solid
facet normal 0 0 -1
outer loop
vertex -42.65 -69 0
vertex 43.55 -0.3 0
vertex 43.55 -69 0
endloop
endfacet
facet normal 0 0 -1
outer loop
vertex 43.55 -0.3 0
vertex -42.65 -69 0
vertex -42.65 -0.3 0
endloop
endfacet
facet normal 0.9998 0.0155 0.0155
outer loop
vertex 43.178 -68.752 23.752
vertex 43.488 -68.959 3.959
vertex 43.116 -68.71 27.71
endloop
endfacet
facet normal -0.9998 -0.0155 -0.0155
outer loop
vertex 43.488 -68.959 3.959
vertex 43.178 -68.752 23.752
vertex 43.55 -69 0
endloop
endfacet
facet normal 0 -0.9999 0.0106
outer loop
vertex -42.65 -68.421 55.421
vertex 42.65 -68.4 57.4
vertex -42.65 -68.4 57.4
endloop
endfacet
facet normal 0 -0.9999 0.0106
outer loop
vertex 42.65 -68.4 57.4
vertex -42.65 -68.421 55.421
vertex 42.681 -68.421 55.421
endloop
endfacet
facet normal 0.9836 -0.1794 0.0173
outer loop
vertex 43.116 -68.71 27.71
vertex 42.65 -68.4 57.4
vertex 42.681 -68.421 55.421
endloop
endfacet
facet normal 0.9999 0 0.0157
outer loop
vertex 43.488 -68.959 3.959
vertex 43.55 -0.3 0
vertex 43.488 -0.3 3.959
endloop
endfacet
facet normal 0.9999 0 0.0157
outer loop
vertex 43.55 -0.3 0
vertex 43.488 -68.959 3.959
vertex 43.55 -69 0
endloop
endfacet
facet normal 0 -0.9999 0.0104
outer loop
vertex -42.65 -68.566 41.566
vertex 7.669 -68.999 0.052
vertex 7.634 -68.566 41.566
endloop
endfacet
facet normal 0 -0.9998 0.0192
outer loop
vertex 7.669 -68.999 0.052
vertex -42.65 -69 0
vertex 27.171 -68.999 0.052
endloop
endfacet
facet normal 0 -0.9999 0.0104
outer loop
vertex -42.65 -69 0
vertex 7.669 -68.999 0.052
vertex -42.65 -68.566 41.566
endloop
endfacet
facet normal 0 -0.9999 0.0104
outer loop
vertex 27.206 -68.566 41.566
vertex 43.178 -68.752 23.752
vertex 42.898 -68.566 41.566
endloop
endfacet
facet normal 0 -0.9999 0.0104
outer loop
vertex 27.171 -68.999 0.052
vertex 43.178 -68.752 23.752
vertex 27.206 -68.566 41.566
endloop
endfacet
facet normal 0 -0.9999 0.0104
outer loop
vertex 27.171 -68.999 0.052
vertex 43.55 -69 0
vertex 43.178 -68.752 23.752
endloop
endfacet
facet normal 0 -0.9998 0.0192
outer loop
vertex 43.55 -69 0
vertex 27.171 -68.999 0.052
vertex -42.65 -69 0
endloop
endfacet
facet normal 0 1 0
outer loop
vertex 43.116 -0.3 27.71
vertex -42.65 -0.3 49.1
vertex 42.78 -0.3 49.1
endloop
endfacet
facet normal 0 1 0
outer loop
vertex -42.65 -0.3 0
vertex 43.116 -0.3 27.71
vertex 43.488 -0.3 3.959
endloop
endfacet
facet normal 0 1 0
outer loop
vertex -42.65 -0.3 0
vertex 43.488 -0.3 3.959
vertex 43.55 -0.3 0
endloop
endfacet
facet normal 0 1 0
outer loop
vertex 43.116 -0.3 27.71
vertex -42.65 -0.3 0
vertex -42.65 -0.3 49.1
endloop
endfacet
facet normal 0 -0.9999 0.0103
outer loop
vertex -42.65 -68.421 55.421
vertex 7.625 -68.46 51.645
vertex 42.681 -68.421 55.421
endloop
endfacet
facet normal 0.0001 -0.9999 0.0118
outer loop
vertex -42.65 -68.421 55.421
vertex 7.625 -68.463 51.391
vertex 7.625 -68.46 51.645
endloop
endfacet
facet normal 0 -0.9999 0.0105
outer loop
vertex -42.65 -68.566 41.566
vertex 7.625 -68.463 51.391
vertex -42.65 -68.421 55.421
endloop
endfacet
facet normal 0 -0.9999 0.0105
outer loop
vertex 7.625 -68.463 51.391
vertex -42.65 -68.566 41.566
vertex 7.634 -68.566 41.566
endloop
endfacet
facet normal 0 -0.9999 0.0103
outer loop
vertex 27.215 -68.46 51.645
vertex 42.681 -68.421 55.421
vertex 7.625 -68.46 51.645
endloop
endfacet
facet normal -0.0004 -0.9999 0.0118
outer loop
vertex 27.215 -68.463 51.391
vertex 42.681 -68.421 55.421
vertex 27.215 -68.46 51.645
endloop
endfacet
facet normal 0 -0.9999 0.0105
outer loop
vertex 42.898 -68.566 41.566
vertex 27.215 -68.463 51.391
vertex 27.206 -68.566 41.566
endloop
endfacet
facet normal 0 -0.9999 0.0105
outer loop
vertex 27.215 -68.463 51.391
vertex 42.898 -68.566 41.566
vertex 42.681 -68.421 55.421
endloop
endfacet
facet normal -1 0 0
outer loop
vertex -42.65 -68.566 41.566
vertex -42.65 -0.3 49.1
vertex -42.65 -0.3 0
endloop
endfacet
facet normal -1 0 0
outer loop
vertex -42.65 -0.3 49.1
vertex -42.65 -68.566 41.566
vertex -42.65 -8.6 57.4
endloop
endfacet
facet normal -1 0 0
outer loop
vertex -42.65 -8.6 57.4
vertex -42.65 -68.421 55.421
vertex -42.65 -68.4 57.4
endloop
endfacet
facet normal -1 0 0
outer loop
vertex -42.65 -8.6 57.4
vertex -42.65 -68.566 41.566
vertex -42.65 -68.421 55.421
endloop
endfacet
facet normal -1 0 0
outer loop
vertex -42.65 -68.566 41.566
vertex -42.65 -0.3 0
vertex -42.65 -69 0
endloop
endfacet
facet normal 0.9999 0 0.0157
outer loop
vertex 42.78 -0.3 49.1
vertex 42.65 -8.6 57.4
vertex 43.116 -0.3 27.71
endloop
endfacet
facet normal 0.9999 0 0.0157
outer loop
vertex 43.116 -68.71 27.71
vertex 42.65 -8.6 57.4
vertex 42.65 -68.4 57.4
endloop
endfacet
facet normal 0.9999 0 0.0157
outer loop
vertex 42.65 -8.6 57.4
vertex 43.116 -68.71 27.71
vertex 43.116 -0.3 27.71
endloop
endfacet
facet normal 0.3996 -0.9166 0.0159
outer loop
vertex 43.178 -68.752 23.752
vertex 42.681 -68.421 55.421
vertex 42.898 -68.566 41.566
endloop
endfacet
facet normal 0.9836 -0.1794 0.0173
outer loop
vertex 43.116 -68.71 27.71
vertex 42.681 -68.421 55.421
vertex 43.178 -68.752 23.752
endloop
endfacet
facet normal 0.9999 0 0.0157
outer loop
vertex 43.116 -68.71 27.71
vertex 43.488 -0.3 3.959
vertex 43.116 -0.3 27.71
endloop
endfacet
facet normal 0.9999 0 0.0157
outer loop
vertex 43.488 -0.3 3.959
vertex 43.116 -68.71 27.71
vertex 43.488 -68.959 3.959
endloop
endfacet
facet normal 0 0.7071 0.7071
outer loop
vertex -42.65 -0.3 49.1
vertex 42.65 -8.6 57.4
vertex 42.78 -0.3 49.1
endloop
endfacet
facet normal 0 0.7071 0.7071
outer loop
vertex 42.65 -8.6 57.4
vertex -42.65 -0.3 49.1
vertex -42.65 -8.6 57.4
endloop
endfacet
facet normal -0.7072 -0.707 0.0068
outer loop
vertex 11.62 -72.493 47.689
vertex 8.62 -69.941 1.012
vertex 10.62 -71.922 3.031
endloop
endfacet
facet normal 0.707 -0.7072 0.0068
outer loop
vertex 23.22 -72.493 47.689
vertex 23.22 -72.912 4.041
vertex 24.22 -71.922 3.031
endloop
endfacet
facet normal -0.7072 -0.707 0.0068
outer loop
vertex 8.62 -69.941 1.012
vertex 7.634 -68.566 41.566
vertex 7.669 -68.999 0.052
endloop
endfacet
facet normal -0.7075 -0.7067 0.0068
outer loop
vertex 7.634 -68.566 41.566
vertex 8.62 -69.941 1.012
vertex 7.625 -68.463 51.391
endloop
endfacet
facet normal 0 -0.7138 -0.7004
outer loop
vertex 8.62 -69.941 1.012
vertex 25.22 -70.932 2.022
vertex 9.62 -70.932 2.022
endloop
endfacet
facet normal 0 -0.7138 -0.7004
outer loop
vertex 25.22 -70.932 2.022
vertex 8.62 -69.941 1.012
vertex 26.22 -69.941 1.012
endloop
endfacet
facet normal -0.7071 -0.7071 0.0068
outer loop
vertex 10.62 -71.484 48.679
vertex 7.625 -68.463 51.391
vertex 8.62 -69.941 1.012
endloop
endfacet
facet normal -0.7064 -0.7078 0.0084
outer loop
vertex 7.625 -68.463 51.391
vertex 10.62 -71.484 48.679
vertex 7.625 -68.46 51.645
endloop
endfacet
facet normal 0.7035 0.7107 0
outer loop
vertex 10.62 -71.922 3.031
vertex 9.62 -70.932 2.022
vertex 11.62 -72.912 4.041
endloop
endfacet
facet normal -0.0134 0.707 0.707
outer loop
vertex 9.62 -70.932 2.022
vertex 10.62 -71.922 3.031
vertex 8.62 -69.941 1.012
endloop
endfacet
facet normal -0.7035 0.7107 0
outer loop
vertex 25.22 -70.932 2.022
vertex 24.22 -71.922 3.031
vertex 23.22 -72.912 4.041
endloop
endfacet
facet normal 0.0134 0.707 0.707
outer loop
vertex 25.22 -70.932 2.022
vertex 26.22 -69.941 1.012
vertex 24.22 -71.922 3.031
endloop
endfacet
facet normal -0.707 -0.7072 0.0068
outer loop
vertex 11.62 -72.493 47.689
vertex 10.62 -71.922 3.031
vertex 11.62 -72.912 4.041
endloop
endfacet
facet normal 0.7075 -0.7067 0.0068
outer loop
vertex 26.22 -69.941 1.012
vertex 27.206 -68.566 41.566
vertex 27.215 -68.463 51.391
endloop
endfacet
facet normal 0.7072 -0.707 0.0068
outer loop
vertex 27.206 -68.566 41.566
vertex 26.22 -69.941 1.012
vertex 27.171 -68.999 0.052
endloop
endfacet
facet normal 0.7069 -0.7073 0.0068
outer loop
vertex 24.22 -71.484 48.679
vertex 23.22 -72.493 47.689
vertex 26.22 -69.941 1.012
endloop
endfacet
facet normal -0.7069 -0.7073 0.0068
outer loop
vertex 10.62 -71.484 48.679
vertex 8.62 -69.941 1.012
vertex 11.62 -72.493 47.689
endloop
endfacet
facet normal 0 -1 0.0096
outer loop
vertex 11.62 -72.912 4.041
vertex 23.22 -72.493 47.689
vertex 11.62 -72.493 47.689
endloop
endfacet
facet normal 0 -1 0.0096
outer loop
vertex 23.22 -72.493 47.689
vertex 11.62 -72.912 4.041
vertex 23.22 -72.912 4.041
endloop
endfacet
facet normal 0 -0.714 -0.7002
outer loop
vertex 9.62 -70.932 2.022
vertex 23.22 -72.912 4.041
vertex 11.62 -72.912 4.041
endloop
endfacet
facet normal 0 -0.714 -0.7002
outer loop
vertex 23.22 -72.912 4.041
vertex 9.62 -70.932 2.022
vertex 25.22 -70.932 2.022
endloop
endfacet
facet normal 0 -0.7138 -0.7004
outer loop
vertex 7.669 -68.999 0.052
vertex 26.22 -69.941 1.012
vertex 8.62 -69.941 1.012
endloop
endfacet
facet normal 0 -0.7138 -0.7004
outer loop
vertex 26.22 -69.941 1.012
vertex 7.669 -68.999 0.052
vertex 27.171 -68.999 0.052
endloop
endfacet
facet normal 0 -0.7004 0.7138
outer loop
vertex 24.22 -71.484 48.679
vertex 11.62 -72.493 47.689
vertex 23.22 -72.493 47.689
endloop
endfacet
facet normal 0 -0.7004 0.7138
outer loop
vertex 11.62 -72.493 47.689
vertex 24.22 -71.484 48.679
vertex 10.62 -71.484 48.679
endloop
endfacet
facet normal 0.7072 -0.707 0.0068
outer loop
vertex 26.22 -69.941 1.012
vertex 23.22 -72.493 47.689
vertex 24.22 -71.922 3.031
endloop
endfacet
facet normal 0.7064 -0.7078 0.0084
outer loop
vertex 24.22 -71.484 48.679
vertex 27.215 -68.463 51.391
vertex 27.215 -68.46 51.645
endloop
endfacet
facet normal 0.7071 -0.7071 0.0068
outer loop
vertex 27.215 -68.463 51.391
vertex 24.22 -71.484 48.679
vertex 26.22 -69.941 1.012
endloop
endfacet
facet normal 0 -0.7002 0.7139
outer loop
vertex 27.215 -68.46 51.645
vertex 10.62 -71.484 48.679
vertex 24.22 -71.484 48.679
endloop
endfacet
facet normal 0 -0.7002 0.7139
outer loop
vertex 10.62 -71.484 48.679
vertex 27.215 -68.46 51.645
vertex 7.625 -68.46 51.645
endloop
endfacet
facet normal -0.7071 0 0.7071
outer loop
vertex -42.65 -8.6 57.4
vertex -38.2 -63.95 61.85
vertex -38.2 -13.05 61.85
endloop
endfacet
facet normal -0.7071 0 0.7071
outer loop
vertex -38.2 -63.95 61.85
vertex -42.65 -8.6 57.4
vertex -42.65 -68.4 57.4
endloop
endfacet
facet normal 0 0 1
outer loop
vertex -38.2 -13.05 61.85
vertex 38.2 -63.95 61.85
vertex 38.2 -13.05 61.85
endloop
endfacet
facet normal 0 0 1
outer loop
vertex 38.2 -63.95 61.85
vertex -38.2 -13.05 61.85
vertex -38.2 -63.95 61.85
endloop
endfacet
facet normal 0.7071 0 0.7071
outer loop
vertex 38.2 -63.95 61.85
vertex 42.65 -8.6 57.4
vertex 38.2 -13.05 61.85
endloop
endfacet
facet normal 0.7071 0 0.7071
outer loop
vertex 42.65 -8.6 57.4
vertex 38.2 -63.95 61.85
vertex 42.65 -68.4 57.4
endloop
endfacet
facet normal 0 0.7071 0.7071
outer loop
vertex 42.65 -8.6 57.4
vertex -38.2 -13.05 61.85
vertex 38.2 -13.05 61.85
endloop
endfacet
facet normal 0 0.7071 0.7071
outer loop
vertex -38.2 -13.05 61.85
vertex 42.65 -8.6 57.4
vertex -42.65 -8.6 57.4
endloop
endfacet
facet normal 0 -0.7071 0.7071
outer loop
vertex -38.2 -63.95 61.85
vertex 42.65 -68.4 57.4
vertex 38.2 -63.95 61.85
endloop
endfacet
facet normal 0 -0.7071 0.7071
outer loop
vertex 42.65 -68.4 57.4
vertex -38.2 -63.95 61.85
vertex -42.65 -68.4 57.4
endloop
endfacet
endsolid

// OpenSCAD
// file: ../utils/chamfer.scad
// From: https://raw.githubusercontent.com/SebiTimeWaster/Chamfers-for-OpenSCAD/master/Chamfer.scad

/**
  *  The MIT License (MIT)
  *
  *  "Chamfers for OpenSCAD" v0.4 Copyright (c) 2016 SebiTimeWaster
  *
  *  Permission is hereby granted, free of charge, to any person obtaining a copy
  *  of this software and associated documentation files (the "Software"), to deal
  *  in the Software without restriction, including without limitation the rights
  *  to use, copy, modify, merge, publish, distribute, sublicense, and/or sell
  *  copies of the Software, and to permit persons to whom the Software is
  *  furnished to do so, subject to the following conditions:
  *
  *  The above copyright notice and this permission notice shall be included in all
  *  copies or substantial portions of the Software.
  *
  *  THE SOFTWARE IS PROVIDED "AS IS", WITHOUT WARRANTY OF ANY KIND, EXPRESS OR
  *  IMPLIED, INCLUDING BUT NOT LIMITED TO THE WARRANTIES OF MERCHANTABILITY,
  *  FITNESS FOR A PARTICULAR PURPOSE AND NONINFRINGEMENT. IN NO EVENT SHALL THE
  *  AUTHORS OR COPYRIGHT HOLDERS BE LIABLE FOR ANY CLAIM, DAMAGES OR OTHER
  *  LIABILITY, WHETHER IN AN ACTION OF CONTRACT, TORT OR OTHERWISE, ARISING FROM,
  *  OUT OF OR IN CONNECTION WITH THE SOFTWARE OR THE USE OR OTHER DEALINGS IN THE
  *  SOFTWARE.
  */

/**
  * chamferCube returns an cube with 45° chamfers on the edges of the
  * cube. The chamfers are diectly printable on Fused deposition
  * modelling (FDM) printers without support structures.
  *
  * @param  sizeX          The size of the cube along the x axis
  * @param  sizeY          The size of the cube along the y axis
  * @param  sizeZ          The size of the cube along the z axis
  * @param  chamferHeight  The "height" of the chamfers as seen from
  *                        one of the dimensional planes (The real
  *                        width is side c in a right angled triangle)
  * @param  chamferX       Which chamfers to render along the x axis
  *                        in clockwise order starting from the zero
  *                        point, as seen from "Left view" (Ctrl + 6)
  * @param  chamferY       Which chamfers to render along the y axis
  *                        in clockwise order starting from the zero
  *                        point, as seen from "Front view" (Ctrl + 8)
  * @param  chamferZ       Which chamfers to render along the z axis
  *                        in clockwise order starting from the zero
  *                        point, as seen from "Bottom view" (Ctrl + 5)
  */
module chamferCube(sizeX, sizeY, sizeZ, chamferHeight = 1, chamferX = [1, 1, 1, 1], chamferY = [1, 1, 1, 1], chamferZ = [1, 1, 1, 1]) {
    chamferCLength = sqrt(chamferHeight * chamferHeight * 2);
    difference() {
        cube([sizeX, sizeY, sizeZ]);
        for(x = [0 : 3]) {
            chamferSide1 = min(x, 1) - floor(x / 3); // 0 1 1 0
            chamferSide2 = floor(x / 2); // 0 0 1 1
            if(chamferX[x]) {
                translate([-0.1, chamferSide1 * sizeY, -chamferHeight + chamferSide2 * sizeZ])
                rotate([45, 0, 0])
                cube([sizeX + 0.2, chamferCLength, chamferCLength]);
            }
            if(chamferY[x]) {
                translate([-chamferHeight + chamferSide2 * sizeX, -0.1, chamferSide1 * sizeZ])
                rotate([0, 45, 0])
                cube([chamferCLength, sizeY + 0.2, chamferCLength]);
            }
            if(chamferZ[x]) {
                translate([chamferSide1 * sizeX, -chamferHeight + chamferSide2 * sizeY, -0.1])
                rotate([0, 0, 45])
                cube([chamferCLength, chamferCLength, sizeZ + 0.2]);
            }
        }
    }
}

/**
  * chamferCylinder returns an cylinder or cone with 45° chamfers on
  * the edges of the cylinder. The chamfers are diectly printable on
  * Fused deposition modelling (FDM) printers without support structures.
  *
  * @param  height         Height of the cylinder
  * @param  radius         Radius of the cylinder (At the bottom)
  * @param  radius2        Radius of the cylinder (At the top)
  * @param  chamferHeight  The "height" of the chamfer at radius 1 as
  *                        seen from one of the dimensional planes (The 
  *                        real width is side c in a right angled triangle)
  * @param  chamferHeight2 The "height" of the chamfer at radius 2 as
  *                        seen from one of the dimensional planes (The 
  *                        real width is side c in a right angled triangle)
  * @param  angle          The radius of the visible part of a wedge
  *                        starting from the x axis counter-clockwise
  * @param  quality        A circle quality factor where 1.0 is a fairly
  *                        good quality, range from 0.0 to 2.0
  */
module chamferCylinder(height, radius, radius2=undef, chamferHeight = 1, chamferHeight2=undef, angle = 0, quality = -1.0) {
    radius2 = (radius2 == undef) ? radius : radius2;
    chamferHeight2 = (chamferHeight2 == undef) ? chamferHeight : chamferHeight2;
    module cc() {
        if(chamferHeight2 != 0) {
            translate([0, 0, height - abs(chamferHeight2)]) cylinder(abs(chamferHeight2), r1 = radius2, r2 = radius2 - chamferHeight2, $fn = circleSegments(radius2, quality));
        }
        translate([0, 0, abs(chamferHeight)]) cylinder(height - abs(chamferHeight2) - abs(chamferHeight), r1 = radius, r2 = radius2, $fn = circleSegments(max(radius, radius2), quality));
        if(chamferHeight2 != 0) {
            cylinder(abs(chamferHeight), r1 = radius - chamferHeight, r2 = radius, $fn = circleSegments(radius, quality));
        }
    }
    module box(brim = abs(min(chamferHeight2, 0)) + 1) {
        translate([-radius - brim, 0, -brim]) cube([radius * 2 + brim * 2, radius + brim, height + brim * 2]);
    }
    module hcc() {
        intersection() {
            cc();
            box();
        }
    }
    if(angle <= 0 || angle >= 360) cc();
    else {
        if(angle > 180) hcc();
        difference() {
            if(angle <= 180) hcc();
            else rotate([0, 0, 180]) hcc();
            rotate([0, 0, angle]) box(abs(min(chamferHeight2, 0)) + radius);
        }
    }
}

/**
  * circleSegments calculates the number of segments needed to maintain
  * a constant circle quality.
  * If a globalSegementsQuality variable exist it will overwrite the
  * standard quality setting (1.0). Order of usage is:
  * Standard (1.0) <- globalCircleQuality <- Quality parameter
  *
  * @param  r        Radius of the circle
  * @param  quality  A quality factor, where 1.0 is a fairly good
  *                  quality, range from 0.0 to 2.0
  *
  * @return  The number of segments for the circle
  */
function circleSegments(r, quality = -1.0) = (r * PI * 4 + 40) * ((quality >= 0.0) ? quality : globalCircleQuality);

// set global quality to 1.0, can be overridden by user
globalCircleQuality = 1.0;
// main file
// Defines the black plastic cover that sits over the DEC motor and electronics.
// Looks like a fairly simple shell with some chamfered edges, but I also
// measure a draft angle on it.
// Note that dec_motor() models the motor cover as a solid, taking up all of
// the volume of the motor and its electronics.
// Author: James Synge

// Units: mm

include <ieq30pro_dimensions.scad>
use <../utils/chamfer.scad>


dec_motor();

// *    dec_motor_shell();

// *translate([200, 0, 0])
//   import("ieq30pro_dec_motor.basic_shell.stl", convexity=10);

module dec_motor() {
  // Position the motor cover so the side facing DEC bearing plane is ~on the
  // Y=0 plane, which may be well suited to rendering it in ra_and_dec.
  translate([-dec_motor_core_top_w/2,
             -dec_motor_core_bottom_h + (dec_motor_core_bottom_h-dec_motor_core_top_h)/2,
             dec_motor_core_z]) {
    color(plastic_color) {
      union() {
        translate([0,dec_motor_core_top_h, 0]) {
          rotate([180,0,0]) {
            dec_motor_core();
          }
        }
        // On the side facing towards the polar scope port there is a little
        // bump out.
        dec_motor_bump();
        // Add the chamfered top section: 45 degree slopes all around.
        dec_motor_top();
      }
    }
    if ($preview) { dec_motor_logo(); };
  };

  // z=34.42 from top section to cut off for dec2
}

module dec_motor_core() {
  intersection() {
    // Basic block of the black plastic motor cover.
    sw = dec_motor_core_bottom_w/dec_motor_core_top_w;
    sh = dec_motor_core_bottom_h/dec_motor_core_top_h;
    linear_extrude(height=dec_motor_core_z, scale=[sw, sh])
      square(size=[dec_motor_core_top_w, dec_motor_core_top_h],
             center=false);

    // Remove the 45 degree sloped section at the top near the DEC
    // bearing. Using difference() was problematic w.r.t.
    // the previews, so I've rotated a "universe" cube 180 around
    // the pivot line and used intersection() to remove the excess.
    // I'm going to the trouble of keeping the "universe" cube of
    // modest size because OpenSCAD's "view all" feature seems to
    // take these the size of all objects, even those that don't
    // remain after intersection() operation has removed them.
    cs = 1.5 * max(dec_motor_core_bottom_w, dec_motor_core_bottom_h, dec_motor_core_z);
    translate([0, dec_motor_core_chamfer_h_offset, 0])
      rotate([45, 0, 0])
        translate([-(cs-dec_motor_core_bottom_w)/2,0,-dec_motor_core_z])
          cube(size=cs, center=false);

  }
}

module dec_motor_top() {
  w = dec_motor_top_base_w;
  h = dec_motor_top_base_h;
  // The chamfers appear to be 45 degrees, so the z by which the top is
  // extruded is also the amount of by which the rectangle is reduced in
  // size on all sides during the extrusion.
  delta = dec_motor_top_z;

  sw = (w - 2 * delta) / w;
  sh = (h - 2 * delta) / h;

  translate([w/2, h/2, 0])
    linear_extrude(height=delta, scale=[sw, sh])
      square(size=[w, h], center=true);
}

module dec_motor_bump() {
  drop_from_top = dec_motor_bump_drop_from_core_top;

  w1 = dec_motor_bump_base_w;
  w2 = dec_motor_bump_outer_w;
  h1 = dec_motor_bump_base_h;
  h2 = dec_motor_bump_outer_h;

  sw = w2 / w1;
  sh = h2 / h1;

  // Where should the bump be placed on the face of the DEC motor? We compute
  // a location by averaging several measurements.
  offset_x1 = dec_motor_bump_left_offset + w1/2;
  offset_x2 = dec_motor_core_top_w - dec_motor_bump_right_offset - w1/2;;
  offset_x = (offset_x1 + offset_x2) / 2;
  // Sadly, this calculation is wrong. I can tell because the bump ends up
  // intersecting the polar port cap. So, I'm just offsetting it so it
  // looks OK.
  offset_x_visual = offset_x + 2;

  rotate([90-dec_motor_draft_angle, 0,0])
    translate([offset_x_visual, -h1/2 - drop_from_top, 0])
      linear_extrude(height=dec_motor_bump_z, scale=[sw, sh])
        square(size=[w1, h1], center=true);
}

module dec_motor_logo() {
  color("white") 
    translate([dec_motor_top_base_w/2,
               dec_motor_top_base_h/2.5,
               dec_motor_top_z])
      linear_extrude(height = 0.05)
        ioptron_logo();
}

module ioptron_logo() {
  font = "Liberation Sans";
  italic_font = str(font, ":style=Italic");
  text("iOptron", size=12, font=italic_font,
       halign="center", valign="bottom", $fn=16);
  translate([0, -4, 0])
    text("iEQ30-Pro", size=6, font=font,
         halign="center", valign="top", $fn=16);
}

// Create a 2mm thick shell from dec_motor(), i.e. remove all but the outermost
// 2mm of the dec_motor() model. This is a quite slow operation (2.5 minutes on
// my laptop), and the resulting preview has lots of rendering artifacts.
// http://forum.openscad.org/I-have-a-suggestion-shell-td1358.html
// https://jweoblog.com/?p=644
module dec_motor_shell() {
  shell_thickness = 2;
  // Steps:
  // 1: Remove DEC motor shaped void from a big cube, producing B.
  // 2: Create Minkowski Sum of B and a sphere whose radius is the desired
  //    shell thickness, producing C. The DEC motor shaped void is a smaller
  //    in C by the shell_thickness.
  // 3: Intersect C and the DEC motor, producing a shell (hollow object) whose
  //    outer surface matches that of the motor.
  color("skyblue")
    intersection() {
      dec_motor();
      minkowski() {
        // Remove DEC motor shaped void from a big cube.
        difference() {
          // Don't include the bottom of dec_motor(), which will thus open
          // up the shell.
          translate([0,0,100+0.01])
            cube(size=200, center=true);
          dec_motor();
        }
        sphere(r=shell_thickness, center=true, $fn=8);
      }
    };
}
